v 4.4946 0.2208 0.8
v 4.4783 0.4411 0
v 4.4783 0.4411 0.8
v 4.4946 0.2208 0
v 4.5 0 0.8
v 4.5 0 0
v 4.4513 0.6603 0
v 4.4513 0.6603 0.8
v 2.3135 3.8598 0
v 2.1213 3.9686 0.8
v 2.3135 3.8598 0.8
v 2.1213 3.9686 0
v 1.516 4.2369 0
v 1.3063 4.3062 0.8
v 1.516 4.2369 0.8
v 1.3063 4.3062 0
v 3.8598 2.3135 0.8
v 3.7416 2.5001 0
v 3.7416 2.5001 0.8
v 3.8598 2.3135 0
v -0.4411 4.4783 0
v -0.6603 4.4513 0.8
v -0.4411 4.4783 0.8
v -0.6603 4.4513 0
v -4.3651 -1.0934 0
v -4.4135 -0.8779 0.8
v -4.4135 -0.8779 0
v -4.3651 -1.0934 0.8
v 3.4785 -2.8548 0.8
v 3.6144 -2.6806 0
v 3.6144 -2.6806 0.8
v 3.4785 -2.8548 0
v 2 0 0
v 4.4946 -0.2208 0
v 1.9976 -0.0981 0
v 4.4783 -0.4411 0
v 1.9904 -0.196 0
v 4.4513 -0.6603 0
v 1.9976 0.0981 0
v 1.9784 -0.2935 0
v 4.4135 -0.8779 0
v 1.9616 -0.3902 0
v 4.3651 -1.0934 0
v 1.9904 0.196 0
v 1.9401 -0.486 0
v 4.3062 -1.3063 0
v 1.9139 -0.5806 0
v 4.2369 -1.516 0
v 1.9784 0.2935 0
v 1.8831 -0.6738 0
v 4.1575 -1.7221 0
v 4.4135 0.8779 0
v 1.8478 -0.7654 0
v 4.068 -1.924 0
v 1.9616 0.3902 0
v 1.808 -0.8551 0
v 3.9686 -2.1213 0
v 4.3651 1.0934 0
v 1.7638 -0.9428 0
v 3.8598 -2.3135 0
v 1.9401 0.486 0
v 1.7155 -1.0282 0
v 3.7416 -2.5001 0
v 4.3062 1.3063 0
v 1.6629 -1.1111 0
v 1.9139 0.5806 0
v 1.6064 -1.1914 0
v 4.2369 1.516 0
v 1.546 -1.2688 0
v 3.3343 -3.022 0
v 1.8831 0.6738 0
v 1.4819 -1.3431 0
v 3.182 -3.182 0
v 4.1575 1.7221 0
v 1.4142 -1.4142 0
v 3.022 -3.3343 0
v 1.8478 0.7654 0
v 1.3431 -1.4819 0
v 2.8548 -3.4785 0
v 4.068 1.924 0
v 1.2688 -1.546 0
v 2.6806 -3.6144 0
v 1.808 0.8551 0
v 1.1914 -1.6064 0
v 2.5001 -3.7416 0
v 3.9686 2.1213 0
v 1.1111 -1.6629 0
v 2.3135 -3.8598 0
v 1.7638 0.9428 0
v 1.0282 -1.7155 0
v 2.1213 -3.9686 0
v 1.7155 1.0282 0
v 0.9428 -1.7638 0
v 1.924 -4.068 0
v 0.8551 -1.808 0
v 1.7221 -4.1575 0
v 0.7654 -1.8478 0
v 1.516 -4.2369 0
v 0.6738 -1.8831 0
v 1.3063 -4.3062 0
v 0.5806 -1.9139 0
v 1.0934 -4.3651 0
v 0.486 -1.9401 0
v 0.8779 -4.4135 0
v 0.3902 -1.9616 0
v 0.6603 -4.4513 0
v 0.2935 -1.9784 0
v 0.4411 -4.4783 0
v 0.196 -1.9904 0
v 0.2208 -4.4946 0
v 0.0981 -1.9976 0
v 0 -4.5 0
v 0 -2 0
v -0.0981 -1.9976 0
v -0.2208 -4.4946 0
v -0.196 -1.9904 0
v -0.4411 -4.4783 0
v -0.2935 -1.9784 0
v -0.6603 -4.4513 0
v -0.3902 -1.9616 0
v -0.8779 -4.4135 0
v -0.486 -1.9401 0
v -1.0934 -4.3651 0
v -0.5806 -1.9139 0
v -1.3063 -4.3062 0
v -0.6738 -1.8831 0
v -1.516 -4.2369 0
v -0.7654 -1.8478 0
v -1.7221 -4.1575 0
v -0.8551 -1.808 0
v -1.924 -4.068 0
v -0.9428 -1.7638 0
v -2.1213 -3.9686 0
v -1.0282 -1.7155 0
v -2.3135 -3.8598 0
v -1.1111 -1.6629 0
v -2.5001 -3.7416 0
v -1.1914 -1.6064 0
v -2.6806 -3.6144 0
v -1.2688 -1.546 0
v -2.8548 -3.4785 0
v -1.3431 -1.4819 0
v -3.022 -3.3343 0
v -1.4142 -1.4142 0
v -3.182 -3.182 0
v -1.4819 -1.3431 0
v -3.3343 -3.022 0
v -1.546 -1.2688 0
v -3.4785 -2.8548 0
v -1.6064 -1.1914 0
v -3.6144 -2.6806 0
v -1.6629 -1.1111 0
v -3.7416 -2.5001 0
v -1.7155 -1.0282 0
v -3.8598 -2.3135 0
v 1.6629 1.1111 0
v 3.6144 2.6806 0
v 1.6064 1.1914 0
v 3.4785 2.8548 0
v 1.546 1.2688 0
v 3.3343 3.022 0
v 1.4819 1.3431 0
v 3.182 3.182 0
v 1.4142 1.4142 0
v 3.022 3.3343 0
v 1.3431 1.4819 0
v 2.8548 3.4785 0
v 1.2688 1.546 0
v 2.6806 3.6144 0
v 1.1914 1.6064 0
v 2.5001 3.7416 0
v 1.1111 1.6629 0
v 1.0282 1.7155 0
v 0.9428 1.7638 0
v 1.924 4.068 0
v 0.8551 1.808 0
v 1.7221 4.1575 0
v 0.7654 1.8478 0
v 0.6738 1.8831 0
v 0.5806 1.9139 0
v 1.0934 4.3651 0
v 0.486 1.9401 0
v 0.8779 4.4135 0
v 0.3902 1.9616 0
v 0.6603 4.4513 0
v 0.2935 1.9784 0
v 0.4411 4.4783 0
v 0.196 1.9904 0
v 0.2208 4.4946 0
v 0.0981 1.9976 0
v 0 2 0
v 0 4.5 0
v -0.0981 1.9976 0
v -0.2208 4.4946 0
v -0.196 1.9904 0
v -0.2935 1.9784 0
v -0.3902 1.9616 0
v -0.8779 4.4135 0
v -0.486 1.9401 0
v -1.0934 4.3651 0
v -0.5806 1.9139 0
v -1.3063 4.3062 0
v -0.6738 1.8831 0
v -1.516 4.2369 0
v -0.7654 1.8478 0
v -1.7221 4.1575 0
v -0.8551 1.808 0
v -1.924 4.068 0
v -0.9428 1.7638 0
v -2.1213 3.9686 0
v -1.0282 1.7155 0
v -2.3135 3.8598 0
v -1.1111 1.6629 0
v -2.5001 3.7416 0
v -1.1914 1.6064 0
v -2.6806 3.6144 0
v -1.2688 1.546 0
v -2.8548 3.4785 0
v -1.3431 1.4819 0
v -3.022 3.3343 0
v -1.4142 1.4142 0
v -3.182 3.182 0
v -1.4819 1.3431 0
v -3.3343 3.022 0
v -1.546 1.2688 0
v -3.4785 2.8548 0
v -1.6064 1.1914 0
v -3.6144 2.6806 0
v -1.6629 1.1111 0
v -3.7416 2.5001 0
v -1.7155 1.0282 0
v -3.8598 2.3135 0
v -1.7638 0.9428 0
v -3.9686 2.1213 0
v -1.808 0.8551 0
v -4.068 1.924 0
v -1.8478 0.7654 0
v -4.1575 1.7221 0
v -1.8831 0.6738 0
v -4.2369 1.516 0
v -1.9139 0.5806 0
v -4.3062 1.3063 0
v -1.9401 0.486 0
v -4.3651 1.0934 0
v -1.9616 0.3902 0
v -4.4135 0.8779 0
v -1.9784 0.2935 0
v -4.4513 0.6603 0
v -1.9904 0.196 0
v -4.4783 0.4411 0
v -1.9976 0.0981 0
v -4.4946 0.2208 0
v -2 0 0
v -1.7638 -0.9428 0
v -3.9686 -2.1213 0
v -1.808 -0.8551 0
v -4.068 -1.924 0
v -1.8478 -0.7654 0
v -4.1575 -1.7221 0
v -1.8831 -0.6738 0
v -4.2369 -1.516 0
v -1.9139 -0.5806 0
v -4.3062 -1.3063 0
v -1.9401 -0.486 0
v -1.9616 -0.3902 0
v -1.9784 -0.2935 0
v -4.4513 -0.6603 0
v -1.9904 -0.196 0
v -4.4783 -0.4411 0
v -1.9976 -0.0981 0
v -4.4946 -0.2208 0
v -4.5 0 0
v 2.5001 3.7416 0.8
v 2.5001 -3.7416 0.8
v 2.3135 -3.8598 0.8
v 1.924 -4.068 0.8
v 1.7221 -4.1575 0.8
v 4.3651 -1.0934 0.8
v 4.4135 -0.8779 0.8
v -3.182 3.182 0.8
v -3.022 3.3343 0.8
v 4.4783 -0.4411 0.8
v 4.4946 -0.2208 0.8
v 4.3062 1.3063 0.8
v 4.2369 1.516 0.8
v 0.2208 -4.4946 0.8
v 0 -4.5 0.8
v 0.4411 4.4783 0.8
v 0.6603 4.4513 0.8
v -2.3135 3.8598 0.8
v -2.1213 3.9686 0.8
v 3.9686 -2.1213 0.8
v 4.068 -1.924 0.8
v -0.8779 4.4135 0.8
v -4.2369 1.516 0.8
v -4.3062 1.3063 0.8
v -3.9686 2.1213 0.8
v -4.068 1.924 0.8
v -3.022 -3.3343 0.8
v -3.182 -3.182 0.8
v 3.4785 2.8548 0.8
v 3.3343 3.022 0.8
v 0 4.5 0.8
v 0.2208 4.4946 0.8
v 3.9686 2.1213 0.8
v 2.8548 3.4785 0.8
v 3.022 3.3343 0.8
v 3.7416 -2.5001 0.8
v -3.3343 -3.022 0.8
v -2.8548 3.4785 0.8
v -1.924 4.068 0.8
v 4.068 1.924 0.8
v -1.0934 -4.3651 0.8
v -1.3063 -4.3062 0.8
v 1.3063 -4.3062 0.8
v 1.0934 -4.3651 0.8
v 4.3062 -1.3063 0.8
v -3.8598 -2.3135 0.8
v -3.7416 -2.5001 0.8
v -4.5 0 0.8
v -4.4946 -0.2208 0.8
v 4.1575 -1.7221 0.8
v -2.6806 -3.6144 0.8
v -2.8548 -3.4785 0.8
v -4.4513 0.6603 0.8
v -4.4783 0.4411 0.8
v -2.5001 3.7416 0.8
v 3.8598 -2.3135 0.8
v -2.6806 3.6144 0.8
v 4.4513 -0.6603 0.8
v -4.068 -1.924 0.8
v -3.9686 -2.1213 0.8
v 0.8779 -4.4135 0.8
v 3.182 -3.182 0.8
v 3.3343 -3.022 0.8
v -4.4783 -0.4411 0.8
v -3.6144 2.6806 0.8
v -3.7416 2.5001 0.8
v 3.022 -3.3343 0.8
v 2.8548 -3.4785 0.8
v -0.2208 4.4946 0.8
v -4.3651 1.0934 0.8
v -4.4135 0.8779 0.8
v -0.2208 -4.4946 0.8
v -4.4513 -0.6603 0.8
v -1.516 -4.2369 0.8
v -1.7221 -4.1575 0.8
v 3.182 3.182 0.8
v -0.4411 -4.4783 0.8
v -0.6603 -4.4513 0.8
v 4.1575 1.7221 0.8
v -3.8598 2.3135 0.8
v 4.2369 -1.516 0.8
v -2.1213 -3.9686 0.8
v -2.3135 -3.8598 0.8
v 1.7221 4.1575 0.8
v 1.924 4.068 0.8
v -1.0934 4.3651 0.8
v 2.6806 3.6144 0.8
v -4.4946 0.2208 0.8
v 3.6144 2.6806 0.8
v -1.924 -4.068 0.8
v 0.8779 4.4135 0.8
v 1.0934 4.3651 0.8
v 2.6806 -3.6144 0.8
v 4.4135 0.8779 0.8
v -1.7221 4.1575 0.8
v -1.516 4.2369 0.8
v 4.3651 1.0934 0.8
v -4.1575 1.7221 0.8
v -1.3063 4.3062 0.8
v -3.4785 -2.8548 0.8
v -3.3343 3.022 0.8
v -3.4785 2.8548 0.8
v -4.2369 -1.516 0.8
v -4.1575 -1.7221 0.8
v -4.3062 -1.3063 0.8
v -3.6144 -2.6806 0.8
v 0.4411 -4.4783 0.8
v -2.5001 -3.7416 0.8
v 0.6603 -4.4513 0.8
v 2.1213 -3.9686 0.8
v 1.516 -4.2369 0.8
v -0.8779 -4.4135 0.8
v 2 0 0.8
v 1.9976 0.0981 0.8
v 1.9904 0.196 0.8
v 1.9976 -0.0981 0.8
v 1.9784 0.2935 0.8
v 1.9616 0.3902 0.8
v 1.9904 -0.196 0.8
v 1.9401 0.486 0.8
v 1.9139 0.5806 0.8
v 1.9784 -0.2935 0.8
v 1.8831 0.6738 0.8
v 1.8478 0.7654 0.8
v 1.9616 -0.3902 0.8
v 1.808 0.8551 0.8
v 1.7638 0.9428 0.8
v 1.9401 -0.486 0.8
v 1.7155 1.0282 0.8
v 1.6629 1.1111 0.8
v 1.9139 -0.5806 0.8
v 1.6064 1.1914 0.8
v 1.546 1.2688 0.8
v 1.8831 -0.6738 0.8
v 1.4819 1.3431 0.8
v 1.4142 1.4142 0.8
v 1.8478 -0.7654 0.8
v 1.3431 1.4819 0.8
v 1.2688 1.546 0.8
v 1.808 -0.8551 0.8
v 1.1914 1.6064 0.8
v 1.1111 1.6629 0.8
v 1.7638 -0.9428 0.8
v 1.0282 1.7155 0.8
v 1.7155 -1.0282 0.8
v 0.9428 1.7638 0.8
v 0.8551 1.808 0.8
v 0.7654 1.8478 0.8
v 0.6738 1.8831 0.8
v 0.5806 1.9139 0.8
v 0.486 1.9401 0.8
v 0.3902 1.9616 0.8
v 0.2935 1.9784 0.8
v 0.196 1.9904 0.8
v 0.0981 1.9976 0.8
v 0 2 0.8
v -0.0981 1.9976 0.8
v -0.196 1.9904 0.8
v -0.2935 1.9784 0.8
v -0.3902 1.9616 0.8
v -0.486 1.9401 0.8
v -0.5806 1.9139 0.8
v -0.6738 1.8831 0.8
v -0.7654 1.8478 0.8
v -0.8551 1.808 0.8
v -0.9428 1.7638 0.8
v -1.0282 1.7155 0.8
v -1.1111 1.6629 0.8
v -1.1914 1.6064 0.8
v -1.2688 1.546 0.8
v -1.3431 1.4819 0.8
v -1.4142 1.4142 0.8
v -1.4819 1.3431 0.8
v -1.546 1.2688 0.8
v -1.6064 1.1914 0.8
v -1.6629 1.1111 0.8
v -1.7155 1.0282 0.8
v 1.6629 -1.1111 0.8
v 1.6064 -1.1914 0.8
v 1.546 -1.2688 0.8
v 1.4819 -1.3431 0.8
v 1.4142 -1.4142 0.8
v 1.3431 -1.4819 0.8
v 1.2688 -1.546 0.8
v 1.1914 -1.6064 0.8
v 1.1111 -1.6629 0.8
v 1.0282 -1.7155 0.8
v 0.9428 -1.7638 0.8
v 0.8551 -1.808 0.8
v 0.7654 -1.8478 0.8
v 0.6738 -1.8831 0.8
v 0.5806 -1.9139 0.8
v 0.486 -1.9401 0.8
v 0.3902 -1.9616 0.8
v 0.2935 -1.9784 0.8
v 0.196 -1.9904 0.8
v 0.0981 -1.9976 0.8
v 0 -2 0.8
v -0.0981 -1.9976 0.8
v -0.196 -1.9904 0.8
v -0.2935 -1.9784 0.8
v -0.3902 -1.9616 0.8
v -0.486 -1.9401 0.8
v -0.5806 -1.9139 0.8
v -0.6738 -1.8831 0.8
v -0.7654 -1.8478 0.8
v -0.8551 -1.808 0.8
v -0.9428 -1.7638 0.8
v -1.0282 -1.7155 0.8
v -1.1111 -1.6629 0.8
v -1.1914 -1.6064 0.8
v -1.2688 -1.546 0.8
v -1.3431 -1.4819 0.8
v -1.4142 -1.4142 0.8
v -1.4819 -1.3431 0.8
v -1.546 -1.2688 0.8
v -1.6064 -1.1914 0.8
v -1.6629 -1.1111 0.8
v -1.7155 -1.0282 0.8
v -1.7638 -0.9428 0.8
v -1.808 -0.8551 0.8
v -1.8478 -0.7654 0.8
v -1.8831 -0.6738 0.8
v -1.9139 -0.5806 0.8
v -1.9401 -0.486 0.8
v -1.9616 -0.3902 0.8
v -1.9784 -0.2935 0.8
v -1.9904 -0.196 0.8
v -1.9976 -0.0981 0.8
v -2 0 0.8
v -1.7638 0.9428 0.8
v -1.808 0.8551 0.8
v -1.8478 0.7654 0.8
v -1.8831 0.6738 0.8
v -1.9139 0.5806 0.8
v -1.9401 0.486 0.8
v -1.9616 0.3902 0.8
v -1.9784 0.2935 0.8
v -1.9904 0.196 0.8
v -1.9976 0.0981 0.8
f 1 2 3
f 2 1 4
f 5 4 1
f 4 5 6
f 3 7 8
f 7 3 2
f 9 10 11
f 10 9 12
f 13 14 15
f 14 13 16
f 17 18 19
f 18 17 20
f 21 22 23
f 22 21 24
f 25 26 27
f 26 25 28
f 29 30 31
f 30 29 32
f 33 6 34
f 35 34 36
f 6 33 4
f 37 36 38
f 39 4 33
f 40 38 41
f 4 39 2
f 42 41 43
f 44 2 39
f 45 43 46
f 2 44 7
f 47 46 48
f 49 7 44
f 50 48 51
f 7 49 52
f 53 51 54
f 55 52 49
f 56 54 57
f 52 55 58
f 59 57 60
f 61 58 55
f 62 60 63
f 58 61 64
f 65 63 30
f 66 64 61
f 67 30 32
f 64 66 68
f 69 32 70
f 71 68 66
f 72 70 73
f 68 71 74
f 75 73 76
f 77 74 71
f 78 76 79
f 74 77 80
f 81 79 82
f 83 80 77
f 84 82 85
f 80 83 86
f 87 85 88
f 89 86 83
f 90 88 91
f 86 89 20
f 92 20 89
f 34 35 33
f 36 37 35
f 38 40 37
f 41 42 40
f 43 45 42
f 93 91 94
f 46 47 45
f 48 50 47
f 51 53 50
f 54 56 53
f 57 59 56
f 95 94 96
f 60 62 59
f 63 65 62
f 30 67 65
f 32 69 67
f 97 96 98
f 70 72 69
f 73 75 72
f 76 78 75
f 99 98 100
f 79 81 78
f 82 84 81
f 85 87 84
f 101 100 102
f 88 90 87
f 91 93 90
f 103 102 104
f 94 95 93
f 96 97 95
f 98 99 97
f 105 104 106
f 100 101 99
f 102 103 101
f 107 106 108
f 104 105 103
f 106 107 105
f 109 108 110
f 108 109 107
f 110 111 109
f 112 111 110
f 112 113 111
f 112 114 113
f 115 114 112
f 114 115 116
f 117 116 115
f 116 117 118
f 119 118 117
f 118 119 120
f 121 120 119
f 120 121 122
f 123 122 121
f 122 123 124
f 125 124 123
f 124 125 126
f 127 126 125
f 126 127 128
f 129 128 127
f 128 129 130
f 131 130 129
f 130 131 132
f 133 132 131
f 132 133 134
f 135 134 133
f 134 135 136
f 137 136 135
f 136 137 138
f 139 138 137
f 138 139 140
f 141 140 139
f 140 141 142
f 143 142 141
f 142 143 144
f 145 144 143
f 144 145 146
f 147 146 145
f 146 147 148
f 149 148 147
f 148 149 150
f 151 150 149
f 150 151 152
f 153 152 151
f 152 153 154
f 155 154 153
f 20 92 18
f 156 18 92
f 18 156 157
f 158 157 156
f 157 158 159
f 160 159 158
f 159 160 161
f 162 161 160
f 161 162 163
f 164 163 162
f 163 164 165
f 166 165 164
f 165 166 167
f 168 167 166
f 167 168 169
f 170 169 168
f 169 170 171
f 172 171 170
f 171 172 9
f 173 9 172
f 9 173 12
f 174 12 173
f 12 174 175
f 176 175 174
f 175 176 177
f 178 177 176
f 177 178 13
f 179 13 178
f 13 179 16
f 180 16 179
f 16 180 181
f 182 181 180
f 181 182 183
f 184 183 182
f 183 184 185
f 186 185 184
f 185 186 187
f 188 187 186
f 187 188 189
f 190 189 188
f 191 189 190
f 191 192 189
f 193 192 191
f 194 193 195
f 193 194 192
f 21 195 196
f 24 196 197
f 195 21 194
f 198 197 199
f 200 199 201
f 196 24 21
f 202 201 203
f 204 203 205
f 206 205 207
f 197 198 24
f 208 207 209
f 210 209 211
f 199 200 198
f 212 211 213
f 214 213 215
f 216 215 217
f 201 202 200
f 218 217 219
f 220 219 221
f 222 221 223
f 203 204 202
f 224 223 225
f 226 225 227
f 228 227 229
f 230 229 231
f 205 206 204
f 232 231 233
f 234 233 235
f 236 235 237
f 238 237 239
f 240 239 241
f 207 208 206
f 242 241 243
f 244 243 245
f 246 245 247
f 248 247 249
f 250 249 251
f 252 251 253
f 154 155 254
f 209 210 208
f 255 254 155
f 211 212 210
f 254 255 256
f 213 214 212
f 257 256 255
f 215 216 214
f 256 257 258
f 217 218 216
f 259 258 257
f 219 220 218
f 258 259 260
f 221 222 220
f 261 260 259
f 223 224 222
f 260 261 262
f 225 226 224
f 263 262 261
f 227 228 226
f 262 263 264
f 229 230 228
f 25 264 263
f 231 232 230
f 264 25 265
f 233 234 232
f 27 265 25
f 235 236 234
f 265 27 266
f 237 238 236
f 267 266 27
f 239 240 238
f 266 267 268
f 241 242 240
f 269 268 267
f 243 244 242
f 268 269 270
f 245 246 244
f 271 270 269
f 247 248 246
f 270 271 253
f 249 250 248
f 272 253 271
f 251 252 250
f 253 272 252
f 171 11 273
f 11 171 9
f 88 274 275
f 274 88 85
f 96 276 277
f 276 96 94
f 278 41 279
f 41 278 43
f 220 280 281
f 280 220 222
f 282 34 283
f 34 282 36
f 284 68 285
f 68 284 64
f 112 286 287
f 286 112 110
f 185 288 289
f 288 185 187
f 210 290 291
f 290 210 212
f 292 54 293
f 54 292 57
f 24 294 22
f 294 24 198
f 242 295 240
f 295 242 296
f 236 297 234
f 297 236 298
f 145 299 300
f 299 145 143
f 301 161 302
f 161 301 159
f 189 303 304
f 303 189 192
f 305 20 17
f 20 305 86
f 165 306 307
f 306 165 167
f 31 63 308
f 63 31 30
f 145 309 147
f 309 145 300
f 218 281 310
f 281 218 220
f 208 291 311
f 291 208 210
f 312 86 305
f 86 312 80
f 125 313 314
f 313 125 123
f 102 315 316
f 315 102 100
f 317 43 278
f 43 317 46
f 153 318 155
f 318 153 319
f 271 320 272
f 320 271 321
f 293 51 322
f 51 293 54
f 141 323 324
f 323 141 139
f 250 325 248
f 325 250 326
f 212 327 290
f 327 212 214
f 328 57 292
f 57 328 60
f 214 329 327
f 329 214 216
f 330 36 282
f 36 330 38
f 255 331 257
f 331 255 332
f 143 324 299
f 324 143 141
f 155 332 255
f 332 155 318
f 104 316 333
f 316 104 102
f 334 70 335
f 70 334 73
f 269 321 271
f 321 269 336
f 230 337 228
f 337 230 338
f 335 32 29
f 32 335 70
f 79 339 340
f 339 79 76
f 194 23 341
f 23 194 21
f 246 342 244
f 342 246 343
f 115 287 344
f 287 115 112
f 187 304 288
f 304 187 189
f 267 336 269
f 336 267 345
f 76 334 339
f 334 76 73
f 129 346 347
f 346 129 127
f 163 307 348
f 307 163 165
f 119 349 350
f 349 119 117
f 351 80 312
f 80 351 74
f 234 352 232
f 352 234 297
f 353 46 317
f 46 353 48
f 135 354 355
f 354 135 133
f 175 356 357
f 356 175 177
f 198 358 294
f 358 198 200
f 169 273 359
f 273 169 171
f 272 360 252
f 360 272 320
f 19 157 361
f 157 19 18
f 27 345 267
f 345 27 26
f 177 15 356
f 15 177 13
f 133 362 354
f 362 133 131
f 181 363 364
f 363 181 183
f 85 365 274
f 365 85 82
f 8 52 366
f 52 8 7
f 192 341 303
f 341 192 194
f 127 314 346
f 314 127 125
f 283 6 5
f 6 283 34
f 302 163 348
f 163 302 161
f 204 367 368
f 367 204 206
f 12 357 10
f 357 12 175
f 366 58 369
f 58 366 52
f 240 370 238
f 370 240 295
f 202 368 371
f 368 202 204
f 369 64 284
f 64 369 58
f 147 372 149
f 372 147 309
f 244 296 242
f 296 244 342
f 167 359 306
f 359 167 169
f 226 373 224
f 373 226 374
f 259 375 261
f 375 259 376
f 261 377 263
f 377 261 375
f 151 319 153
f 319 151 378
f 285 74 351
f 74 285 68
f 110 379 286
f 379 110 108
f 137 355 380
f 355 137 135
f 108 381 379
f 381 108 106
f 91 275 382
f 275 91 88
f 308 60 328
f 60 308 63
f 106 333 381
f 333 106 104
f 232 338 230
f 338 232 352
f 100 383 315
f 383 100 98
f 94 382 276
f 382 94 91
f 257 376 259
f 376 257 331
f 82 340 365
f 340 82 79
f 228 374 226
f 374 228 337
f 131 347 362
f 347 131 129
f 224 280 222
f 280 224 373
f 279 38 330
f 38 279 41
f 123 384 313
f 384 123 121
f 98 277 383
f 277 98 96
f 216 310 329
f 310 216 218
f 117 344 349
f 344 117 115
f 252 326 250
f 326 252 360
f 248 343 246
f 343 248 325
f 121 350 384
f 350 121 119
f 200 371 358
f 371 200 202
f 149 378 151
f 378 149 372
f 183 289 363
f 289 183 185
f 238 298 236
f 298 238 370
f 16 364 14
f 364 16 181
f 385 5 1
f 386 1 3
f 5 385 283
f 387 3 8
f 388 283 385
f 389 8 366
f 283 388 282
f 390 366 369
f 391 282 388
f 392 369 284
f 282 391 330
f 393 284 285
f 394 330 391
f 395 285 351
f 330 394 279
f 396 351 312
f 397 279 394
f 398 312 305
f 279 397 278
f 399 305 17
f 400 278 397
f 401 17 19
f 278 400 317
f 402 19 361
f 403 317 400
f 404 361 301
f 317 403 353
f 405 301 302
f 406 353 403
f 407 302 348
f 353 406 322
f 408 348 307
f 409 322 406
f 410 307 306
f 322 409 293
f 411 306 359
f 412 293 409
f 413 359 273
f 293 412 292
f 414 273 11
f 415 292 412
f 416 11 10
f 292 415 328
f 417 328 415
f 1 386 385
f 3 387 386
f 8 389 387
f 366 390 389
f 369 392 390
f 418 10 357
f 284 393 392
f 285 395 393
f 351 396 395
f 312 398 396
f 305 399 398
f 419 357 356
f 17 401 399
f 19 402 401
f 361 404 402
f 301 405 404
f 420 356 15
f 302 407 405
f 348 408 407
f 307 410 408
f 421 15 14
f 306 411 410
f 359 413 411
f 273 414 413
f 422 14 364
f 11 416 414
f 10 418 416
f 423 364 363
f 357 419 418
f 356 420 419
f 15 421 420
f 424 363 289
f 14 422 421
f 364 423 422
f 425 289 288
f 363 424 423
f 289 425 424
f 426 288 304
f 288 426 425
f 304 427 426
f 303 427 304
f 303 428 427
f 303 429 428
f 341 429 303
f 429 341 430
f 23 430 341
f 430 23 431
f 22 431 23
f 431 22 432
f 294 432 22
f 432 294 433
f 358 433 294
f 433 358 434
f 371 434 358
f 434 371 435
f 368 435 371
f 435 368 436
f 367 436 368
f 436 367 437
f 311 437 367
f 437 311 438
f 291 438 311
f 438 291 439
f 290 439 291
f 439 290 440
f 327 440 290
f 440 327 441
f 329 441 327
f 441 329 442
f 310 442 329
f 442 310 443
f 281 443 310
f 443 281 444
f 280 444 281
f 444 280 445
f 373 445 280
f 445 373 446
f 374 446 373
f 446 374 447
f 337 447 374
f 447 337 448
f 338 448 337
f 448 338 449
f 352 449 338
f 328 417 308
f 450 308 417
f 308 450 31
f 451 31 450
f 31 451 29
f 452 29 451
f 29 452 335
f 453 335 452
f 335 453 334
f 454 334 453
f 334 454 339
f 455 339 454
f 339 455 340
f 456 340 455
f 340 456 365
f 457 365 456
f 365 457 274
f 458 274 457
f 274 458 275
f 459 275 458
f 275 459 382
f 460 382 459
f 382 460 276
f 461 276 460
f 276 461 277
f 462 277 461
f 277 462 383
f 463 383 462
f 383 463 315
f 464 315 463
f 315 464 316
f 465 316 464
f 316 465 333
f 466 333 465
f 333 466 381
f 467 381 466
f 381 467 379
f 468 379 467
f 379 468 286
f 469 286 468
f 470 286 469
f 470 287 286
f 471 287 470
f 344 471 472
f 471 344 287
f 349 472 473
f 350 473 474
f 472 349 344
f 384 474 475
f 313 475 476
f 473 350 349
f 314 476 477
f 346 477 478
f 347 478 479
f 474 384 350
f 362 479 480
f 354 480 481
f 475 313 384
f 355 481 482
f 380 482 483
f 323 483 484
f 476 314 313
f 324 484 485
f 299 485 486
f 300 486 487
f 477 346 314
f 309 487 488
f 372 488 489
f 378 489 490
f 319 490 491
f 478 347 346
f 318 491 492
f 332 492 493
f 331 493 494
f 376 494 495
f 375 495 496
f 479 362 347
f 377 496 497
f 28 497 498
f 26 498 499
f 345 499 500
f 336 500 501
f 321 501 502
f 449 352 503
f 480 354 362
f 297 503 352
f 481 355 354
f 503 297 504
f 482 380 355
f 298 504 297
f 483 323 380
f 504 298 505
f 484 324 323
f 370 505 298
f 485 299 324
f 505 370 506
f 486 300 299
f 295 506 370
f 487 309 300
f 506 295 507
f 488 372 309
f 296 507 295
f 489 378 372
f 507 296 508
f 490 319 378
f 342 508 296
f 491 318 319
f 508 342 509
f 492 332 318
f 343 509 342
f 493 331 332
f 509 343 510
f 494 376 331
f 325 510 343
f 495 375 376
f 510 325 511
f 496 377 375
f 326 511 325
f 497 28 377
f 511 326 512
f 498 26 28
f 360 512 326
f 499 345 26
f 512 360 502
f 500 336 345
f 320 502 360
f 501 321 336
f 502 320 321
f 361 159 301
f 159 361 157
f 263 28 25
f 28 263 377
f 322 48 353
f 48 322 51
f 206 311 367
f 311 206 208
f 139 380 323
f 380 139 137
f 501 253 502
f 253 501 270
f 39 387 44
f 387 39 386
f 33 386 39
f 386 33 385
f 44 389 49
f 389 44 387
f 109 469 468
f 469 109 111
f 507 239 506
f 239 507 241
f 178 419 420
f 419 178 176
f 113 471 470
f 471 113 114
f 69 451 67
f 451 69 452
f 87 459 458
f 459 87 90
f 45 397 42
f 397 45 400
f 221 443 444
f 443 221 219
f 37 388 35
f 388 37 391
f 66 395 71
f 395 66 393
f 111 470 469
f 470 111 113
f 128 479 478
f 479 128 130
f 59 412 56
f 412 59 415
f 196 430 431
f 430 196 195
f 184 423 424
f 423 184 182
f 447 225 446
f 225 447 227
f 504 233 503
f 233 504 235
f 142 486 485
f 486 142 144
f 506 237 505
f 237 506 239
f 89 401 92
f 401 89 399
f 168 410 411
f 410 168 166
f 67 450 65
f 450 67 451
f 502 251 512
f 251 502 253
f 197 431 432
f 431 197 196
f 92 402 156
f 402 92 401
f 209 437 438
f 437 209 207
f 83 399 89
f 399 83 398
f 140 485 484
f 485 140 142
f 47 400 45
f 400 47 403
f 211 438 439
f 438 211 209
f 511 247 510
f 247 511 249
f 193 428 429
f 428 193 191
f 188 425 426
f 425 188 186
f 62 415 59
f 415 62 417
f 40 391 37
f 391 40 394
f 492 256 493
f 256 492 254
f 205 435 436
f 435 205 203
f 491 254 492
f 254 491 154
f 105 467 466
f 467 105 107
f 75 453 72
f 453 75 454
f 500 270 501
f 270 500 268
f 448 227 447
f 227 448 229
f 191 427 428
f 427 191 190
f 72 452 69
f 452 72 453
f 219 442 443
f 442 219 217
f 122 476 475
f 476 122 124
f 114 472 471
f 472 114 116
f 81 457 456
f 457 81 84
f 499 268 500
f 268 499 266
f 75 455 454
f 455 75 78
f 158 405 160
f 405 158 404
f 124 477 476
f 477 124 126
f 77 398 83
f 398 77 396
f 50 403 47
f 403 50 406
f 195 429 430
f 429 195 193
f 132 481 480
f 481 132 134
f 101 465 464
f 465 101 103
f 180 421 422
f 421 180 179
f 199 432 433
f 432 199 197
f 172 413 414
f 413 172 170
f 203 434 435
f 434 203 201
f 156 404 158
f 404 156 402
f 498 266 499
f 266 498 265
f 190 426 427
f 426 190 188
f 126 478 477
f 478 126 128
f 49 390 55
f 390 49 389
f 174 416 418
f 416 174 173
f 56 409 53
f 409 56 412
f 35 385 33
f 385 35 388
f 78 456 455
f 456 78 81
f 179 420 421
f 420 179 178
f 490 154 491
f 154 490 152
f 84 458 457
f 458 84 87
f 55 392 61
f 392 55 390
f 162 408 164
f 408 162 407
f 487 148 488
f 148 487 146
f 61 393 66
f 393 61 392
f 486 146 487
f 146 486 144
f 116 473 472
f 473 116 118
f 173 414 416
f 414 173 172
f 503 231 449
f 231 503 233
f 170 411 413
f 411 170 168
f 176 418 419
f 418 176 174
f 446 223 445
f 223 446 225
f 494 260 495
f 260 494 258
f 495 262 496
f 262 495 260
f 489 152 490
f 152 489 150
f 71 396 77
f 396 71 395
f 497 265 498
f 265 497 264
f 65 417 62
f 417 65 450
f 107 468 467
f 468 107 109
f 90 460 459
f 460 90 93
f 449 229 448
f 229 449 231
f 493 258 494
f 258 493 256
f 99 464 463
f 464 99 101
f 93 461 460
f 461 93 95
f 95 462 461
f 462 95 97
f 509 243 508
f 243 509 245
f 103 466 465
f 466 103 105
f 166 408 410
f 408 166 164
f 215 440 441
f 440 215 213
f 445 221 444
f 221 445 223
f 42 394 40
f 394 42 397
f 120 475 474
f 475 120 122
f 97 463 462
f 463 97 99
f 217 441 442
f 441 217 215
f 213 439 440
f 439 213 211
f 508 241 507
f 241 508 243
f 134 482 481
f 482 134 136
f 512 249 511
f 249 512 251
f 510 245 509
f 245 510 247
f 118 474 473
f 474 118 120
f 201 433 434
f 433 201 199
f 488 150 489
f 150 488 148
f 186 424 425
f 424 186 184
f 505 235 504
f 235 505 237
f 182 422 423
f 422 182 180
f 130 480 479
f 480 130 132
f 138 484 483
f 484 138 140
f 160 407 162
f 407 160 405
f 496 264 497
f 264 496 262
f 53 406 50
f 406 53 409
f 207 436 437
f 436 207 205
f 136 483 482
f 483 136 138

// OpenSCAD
$fn = 128;

inner_d = 4.0;
outer_d = 9.0;
thickness = 0.8;

difference() {
  cylinder(h = thickness, d = outer_d);
  cylinder(h = thickness + 0.2, d = inner_d);
}
